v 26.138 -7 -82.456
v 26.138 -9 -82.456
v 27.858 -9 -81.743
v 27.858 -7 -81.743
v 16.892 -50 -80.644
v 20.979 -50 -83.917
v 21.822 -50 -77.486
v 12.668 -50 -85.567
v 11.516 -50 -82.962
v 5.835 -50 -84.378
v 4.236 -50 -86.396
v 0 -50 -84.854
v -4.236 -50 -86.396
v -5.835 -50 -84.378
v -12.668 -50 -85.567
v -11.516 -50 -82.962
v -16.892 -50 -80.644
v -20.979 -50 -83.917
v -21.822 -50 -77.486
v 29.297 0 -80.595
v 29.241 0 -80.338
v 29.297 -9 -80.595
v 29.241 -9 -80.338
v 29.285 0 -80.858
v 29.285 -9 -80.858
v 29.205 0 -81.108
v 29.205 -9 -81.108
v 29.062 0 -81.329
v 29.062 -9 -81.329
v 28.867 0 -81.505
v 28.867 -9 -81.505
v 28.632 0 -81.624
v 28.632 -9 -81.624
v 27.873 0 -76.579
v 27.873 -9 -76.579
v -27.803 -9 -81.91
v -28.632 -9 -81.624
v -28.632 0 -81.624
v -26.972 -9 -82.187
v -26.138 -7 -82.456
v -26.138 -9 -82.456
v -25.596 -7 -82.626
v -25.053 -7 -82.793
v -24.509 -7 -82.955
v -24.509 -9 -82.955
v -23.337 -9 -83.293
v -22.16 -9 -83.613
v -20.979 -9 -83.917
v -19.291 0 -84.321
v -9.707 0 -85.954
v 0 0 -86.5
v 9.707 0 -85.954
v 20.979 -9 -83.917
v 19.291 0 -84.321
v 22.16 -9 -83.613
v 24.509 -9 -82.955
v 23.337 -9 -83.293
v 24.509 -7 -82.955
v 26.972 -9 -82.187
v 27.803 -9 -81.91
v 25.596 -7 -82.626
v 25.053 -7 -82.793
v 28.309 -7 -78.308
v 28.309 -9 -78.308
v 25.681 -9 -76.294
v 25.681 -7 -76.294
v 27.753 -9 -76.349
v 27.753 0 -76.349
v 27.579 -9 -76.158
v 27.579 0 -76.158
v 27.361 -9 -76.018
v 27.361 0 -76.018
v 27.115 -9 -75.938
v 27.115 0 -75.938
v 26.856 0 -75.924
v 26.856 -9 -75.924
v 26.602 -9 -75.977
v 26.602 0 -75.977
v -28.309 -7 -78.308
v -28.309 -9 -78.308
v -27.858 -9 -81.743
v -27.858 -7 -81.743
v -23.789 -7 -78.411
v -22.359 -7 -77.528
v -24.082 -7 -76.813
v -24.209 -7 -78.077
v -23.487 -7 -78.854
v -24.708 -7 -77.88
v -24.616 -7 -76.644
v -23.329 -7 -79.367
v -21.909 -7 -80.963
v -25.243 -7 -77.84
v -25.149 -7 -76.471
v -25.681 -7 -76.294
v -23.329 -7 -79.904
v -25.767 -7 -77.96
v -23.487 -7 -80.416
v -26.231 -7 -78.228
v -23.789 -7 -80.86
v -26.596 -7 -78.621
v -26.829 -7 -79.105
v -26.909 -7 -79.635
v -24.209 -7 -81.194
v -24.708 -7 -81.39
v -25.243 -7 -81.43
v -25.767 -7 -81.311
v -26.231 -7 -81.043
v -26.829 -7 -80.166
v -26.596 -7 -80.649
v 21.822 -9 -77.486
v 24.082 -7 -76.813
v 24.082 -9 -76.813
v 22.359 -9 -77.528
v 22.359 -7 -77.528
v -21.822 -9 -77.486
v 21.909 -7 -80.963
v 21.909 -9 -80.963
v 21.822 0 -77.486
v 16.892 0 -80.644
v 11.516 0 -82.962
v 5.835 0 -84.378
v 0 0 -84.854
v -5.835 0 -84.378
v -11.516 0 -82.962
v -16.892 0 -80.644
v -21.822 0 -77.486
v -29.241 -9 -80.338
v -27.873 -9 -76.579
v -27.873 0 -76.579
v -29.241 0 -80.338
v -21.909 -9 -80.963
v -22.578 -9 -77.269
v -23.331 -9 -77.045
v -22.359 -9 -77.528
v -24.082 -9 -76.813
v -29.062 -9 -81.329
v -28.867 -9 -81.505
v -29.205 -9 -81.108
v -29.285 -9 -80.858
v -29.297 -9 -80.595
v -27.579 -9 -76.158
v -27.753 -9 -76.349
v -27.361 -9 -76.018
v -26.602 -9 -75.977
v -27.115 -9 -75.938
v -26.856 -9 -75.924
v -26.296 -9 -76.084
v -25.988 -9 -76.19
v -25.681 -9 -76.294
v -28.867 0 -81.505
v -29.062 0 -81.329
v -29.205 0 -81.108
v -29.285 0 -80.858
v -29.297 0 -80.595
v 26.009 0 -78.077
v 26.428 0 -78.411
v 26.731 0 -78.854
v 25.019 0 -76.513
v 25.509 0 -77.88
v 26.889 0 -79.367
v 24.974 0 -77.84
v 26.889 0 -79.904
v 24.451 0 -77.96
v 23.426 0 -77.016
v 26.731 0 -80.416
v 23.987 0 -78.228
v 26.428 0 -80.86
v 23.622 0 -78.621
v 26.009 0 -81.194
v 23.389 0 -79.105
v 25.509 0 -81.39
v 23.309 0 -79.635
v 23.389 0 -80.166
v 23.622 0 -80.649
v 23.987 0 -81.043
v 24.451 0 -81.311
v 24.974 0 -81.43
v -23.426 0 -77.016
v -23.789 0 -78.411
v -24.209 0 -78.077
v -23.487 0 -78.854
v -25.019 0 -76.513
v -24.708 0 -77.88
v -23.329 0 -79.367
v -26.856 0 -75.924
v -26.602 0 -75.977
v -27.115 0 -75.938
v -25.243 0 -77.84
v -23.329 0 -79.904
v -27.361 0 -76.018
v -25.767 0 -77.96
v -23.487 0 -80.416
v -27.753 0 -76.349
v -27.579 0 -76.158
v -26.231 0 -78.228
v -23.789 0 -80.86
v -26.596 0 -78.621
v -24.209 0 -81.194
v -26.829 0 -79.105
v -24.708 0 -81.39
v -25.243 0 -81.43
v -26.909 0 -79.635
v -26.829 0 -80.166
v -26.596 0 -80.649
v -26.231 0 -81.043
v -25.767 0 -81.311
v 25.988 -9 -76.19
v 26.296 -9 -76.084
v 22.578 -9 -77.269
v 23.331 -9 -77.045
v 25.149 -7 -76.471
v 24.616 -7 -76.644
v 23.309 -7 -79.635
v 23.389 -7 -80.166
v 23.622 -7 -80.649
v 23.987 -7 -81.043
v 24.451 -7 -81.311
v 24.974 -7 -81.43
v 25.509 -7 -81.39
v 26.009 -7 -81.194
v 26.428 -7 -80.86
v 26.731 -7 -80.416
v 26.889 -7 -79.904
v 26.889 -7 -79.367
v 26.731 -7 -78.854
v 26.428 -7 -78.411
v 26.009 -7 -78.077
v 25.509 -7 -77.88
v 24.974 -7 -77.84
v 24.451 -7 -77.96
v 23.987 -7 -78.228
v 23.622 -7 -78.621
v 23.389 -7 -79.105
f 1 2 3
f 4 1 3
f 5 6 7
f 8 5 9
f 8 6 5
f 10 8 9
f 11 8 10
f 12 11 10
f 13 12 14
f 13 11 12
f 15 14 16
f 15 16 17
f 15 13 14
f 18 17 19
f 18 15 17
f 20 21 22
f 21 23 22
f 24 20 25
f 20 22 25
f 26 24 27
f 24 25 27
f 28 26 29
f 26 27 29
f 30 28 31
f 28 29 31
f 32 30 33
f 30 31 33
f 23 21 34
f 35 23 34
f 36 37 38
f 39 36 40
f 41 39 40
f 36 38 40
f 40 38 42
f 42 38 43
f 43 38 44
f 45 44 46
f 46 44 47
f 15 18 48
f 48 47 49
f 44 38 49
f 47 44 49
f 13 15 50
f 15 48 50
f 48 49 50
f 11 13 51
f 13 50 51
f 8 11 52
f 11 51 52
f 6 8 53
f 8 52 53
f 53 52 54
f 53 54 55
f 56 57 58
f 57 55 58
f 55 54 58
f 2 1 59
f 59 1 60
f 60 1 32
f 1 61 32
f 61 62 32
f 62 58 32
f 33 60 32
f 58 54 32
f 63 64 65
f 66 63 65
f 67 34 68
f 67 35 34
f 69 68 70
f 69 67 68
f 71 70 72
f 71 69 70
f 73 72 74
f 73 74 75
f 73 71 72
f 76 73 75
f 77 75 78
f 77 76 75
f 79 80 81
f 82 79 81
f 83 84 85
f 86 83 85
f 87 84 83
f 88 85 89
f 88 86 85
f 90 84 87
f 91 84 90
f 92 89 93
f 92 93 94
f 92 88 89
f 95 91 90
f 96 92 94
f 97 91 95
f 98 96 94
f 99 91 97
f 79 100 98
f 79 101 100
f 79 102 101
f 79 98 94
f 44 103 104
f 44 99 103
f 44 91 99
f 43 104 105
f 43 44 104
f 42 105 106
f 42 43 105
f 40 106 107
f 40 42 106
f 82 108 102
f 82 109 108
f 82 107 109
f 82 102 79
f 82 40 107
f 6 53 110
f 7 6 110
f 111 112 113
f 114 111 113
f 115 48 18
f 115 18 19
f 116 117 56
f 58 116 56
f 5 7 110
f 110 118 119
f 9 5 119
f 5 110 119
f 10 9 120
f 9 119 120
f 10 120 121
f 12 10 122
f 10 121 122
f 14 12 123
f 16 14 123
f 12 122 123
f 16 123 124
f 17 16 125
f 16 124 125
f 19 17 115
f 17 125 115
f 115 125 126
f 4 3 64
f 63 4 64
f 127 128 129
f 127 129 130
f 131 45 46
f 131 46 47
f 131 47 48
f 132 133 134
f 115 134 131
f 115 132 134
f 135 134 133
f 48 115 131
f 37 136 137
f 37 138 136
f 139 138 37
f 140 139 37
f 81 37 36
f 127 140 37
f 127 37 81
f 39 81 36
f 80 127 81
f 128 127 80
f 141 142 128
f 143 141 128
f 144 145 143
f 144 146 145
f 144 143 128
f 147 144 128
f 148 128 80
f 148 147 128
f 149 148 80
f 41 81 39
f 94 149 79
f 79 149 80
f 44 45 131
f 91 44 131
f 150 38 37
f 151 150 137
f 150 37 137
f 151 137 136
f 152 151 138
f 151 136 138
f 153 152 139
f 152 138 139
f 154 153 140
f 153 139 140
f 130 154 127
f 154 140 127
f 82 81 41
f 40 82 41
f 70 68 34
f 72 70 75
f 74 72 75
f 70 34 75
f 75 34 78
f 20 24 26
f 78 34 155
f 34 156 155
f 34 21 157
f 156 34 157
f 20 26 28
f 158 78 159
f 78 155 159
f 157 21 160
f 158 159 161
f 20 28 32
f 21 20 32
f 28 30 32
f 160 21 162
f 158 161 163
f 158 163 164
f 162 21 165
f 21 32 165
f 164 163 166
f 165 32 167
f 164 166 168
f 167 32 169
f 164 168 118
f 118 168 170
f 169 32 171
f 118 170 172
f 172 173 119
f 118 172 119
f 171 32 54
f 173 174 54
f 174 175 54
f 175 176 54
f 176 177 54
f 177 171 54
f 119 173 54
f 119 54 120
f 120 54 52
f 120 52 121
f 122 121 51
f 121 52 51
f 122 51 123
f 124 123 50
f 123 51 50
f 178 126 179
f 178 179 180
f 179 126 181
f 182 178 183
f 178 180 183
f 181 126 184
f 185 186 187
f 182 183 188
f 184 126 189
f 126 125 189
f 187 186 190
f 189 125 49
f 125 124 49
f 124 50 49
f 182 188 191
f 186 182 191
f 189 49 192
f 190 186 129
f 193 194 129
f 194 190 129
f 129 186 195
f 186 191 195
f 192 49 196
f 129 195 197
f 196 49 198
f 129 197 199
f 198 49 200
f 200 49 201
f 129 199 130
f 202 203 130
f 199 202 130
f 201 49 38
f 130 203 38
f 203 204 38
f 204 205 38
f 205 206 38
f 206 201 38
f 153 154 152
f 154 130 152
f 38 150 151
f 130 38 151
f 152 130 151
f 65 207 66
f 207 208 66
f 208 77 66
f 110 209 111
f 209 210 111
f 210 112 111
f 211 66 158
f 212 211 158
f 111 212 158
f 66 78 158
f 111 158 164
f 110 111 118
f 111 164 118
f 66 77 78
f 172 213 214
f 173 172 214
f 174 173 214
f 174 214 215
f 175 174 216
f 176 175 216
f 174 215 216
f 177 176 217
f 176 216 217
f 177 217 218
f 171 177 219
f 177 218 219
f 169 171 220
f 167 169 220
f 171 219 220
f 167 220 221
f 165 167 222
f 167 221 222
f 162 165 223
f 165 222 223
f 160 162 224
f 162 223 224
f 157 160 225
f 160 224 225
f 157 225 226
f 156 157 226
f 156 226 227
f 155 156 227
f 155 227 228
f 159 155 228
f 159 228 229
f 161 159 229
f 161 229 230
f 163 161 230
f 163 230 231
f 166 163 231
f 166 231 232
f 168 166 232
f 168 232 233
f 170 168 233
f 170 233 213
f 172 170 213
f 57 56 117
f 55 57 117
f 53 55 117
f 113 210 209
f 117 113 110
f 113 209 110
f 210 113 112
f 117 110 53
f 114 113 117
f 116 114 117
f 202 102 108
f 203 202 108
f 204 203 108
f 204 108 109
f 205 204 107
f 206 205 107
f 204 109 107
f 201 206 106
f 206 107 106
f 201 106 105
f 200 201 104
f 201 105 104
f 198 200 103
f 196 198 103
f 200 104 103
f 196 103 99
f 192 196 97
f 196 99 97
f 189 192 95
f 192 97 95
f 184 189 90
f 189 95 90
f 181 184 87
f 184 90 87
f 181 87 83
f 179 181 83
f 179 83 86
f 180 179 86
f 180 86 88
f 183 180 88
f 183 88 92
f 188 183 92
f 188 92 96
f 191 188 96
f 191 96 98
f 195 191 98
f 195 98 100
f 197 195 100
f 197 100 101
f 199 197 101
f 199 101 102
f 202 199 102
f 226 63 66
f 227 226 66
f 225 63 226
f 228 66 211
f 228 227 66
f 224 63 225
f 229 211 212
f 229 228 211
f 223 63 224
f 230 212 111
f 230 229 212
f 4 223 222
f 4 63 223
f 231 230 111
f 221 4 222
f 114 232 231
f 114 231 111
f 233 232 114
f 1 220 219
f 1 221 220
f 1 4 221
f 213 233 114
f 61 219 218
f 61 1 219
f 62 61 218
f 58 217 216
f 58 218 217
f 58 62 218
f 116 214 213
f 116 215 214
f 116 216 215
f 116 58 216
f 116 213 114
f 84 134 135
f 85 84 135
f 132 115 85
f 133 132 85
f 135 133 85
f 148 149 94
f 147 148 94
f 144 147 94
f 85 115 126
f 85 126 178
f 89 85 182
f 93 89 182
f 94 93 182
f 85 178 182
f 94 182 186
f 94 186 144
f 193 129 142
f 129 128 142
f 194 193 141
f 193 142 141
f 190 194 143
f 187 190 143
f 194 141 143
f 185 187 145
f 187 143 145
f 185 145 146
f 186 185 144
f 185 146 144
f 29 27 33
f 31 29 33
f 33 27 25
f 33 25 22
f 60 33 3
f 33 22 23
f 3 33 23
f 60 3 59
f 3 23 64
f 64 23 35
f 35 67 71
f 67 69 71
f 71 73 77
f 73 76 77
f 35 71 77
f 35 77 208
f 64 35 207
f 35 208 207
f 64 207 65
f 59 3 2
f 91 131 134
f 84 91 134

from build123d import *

# Parameters (mm, degrees)
BOSS_EXTRUDE1_DEPTH  = 50
M3_CLEARANCE_HOLE1_D = 3.6
CUT_EXTRUDE1_START   = -41
CUT_EXTRUDE1_DEPTH   = 41
CUT_EXTRUDE2_DEPTH   = 2
FILLET1_R            = 1


with BuildPart() as part:
    # Sketch1 → Boss-Extrude1 (new body)
    with BuildSketch(Plane(origin=(0, 0, 0), x_dir=(1, 0, 0), z_dir=(0, 1, 0))):
        with BuildLine():
            Line((29.584742398, 81.283411698), (27.532621538, 75.645255973))
            ThreePointArc((27.532621538, 75.645255973), (24.694417894, 76.618768751), (21.821905854, 77.485833704))
            ThreePointArc((21.821905854, 77.485833704), (0, 84.853606671), (-21.821905854, 77.485833704))
            ThreePointArc((-21.821905854, 77.485833704), (-24.694417894, 76.618768751), (-27.532621538, 75.645255973))
            Line((-27.532621538, 75.645255973), (-29.584742398, 81.283411698))
            ThreePointArc((-29.584742398, 81.283411698), (0, 86.5), (29.584742398, 81.283411698))
        make_face()
    extrude(amount=-BOSS_EXTRUDE1_DEPTH)

    # M3 Clearance Hole1 (through all)
    with Locations(Plane(origin=(0, 0, 0), x_dir=(1, 0, 0), z_dir=(0, 1, 0))):
        with Locations((-25.108934259, 79.635365387), (25.108934259, 79.635365387)):
            Hole(M3_CLEARANCE_HOLE1_D / 2)

    # Sketch4 → Cut-Extrude1 (cut)
    with BuildSketch(Plane.XZ.offset(50).offset(CUT_EXTRUDE1_START)):
        with BuildLine():
            Line((-27.532621538, -75.645255973), (-29.584742398, -81.283411698))
            ThreePointArc((-29.584742398, -81.283411698), (-25.316064331, -82.712434898), (-20.978824316, -83.917453073))
            Line((-20.978824316, -83.917453073), (-21.821905854, -77.485833704))
            ThreePointArc((-21.821905854, -77.485833704), (-24.694417894, -76.618768751), (-27.532621538, -75.645255973))
        make_face()
        with BuildLine():
            Line((27.532621538, -75.645255973), (29.584742398, -81.283411698))
            ThreePointArc((29.584742398, -81.283411698), (25.316064331, -82.712434898), (20.978824316, -83.917453073))
            Line((20.978824316, -83.917453073), (21.821905854, -77.485833704))
            ThreePointArc((21.821905854, -77.485833704), (24.694417894, -76.618768751), (27.532621538, -75.645255973))
        make_face()
    extrude(amount=CUT_EXTRUDE1_DEPTH, mode=Mode.SUBTRACT)

    # Sketch5 → Cut-Extrude2 (cut)
    with BuildSketch(Plane(origin=(0, -9, 0), x_dir=(-1, 0, 0), z_dir=(0, -1, 0))):
        Polygon((25.559170371, 76.200647431), (28.30860532, 78.30792232), (27.858369208, 81.742640277), (24.658698146, 83.070083344), (21.909263197, 80.962808455), (22.359499309, 77.528090498), align=None)
        Polygon((-28.30860532, 78.30792232), (-25.559170371, 76.200647431), (-22.359499309, 77.528090498), (-21.909263197, 80.962808455), (-24.658698146, 83.070083344), (-27.858369208, 81.742640277), align=None)
    extrude(amount=-CUT_EXTRUDE2_DEPTH, mode=Mode.SUBTRACT)

    # Fillet1
    fillet1_edges = [part.edges().sort_by_distance(p)[0] for p in [
        (27.532621538, -4.5, -75.645255973),
        (29.584742398, -4.5, -81.283411698),
        (-29.584742398, -4.5, -81.283411698),
        (-27.532621538, -4.5, -75.645255973),
    ]]
    fillet(fillet1_edges, radius=FILLET1_R)


solid = part.part
